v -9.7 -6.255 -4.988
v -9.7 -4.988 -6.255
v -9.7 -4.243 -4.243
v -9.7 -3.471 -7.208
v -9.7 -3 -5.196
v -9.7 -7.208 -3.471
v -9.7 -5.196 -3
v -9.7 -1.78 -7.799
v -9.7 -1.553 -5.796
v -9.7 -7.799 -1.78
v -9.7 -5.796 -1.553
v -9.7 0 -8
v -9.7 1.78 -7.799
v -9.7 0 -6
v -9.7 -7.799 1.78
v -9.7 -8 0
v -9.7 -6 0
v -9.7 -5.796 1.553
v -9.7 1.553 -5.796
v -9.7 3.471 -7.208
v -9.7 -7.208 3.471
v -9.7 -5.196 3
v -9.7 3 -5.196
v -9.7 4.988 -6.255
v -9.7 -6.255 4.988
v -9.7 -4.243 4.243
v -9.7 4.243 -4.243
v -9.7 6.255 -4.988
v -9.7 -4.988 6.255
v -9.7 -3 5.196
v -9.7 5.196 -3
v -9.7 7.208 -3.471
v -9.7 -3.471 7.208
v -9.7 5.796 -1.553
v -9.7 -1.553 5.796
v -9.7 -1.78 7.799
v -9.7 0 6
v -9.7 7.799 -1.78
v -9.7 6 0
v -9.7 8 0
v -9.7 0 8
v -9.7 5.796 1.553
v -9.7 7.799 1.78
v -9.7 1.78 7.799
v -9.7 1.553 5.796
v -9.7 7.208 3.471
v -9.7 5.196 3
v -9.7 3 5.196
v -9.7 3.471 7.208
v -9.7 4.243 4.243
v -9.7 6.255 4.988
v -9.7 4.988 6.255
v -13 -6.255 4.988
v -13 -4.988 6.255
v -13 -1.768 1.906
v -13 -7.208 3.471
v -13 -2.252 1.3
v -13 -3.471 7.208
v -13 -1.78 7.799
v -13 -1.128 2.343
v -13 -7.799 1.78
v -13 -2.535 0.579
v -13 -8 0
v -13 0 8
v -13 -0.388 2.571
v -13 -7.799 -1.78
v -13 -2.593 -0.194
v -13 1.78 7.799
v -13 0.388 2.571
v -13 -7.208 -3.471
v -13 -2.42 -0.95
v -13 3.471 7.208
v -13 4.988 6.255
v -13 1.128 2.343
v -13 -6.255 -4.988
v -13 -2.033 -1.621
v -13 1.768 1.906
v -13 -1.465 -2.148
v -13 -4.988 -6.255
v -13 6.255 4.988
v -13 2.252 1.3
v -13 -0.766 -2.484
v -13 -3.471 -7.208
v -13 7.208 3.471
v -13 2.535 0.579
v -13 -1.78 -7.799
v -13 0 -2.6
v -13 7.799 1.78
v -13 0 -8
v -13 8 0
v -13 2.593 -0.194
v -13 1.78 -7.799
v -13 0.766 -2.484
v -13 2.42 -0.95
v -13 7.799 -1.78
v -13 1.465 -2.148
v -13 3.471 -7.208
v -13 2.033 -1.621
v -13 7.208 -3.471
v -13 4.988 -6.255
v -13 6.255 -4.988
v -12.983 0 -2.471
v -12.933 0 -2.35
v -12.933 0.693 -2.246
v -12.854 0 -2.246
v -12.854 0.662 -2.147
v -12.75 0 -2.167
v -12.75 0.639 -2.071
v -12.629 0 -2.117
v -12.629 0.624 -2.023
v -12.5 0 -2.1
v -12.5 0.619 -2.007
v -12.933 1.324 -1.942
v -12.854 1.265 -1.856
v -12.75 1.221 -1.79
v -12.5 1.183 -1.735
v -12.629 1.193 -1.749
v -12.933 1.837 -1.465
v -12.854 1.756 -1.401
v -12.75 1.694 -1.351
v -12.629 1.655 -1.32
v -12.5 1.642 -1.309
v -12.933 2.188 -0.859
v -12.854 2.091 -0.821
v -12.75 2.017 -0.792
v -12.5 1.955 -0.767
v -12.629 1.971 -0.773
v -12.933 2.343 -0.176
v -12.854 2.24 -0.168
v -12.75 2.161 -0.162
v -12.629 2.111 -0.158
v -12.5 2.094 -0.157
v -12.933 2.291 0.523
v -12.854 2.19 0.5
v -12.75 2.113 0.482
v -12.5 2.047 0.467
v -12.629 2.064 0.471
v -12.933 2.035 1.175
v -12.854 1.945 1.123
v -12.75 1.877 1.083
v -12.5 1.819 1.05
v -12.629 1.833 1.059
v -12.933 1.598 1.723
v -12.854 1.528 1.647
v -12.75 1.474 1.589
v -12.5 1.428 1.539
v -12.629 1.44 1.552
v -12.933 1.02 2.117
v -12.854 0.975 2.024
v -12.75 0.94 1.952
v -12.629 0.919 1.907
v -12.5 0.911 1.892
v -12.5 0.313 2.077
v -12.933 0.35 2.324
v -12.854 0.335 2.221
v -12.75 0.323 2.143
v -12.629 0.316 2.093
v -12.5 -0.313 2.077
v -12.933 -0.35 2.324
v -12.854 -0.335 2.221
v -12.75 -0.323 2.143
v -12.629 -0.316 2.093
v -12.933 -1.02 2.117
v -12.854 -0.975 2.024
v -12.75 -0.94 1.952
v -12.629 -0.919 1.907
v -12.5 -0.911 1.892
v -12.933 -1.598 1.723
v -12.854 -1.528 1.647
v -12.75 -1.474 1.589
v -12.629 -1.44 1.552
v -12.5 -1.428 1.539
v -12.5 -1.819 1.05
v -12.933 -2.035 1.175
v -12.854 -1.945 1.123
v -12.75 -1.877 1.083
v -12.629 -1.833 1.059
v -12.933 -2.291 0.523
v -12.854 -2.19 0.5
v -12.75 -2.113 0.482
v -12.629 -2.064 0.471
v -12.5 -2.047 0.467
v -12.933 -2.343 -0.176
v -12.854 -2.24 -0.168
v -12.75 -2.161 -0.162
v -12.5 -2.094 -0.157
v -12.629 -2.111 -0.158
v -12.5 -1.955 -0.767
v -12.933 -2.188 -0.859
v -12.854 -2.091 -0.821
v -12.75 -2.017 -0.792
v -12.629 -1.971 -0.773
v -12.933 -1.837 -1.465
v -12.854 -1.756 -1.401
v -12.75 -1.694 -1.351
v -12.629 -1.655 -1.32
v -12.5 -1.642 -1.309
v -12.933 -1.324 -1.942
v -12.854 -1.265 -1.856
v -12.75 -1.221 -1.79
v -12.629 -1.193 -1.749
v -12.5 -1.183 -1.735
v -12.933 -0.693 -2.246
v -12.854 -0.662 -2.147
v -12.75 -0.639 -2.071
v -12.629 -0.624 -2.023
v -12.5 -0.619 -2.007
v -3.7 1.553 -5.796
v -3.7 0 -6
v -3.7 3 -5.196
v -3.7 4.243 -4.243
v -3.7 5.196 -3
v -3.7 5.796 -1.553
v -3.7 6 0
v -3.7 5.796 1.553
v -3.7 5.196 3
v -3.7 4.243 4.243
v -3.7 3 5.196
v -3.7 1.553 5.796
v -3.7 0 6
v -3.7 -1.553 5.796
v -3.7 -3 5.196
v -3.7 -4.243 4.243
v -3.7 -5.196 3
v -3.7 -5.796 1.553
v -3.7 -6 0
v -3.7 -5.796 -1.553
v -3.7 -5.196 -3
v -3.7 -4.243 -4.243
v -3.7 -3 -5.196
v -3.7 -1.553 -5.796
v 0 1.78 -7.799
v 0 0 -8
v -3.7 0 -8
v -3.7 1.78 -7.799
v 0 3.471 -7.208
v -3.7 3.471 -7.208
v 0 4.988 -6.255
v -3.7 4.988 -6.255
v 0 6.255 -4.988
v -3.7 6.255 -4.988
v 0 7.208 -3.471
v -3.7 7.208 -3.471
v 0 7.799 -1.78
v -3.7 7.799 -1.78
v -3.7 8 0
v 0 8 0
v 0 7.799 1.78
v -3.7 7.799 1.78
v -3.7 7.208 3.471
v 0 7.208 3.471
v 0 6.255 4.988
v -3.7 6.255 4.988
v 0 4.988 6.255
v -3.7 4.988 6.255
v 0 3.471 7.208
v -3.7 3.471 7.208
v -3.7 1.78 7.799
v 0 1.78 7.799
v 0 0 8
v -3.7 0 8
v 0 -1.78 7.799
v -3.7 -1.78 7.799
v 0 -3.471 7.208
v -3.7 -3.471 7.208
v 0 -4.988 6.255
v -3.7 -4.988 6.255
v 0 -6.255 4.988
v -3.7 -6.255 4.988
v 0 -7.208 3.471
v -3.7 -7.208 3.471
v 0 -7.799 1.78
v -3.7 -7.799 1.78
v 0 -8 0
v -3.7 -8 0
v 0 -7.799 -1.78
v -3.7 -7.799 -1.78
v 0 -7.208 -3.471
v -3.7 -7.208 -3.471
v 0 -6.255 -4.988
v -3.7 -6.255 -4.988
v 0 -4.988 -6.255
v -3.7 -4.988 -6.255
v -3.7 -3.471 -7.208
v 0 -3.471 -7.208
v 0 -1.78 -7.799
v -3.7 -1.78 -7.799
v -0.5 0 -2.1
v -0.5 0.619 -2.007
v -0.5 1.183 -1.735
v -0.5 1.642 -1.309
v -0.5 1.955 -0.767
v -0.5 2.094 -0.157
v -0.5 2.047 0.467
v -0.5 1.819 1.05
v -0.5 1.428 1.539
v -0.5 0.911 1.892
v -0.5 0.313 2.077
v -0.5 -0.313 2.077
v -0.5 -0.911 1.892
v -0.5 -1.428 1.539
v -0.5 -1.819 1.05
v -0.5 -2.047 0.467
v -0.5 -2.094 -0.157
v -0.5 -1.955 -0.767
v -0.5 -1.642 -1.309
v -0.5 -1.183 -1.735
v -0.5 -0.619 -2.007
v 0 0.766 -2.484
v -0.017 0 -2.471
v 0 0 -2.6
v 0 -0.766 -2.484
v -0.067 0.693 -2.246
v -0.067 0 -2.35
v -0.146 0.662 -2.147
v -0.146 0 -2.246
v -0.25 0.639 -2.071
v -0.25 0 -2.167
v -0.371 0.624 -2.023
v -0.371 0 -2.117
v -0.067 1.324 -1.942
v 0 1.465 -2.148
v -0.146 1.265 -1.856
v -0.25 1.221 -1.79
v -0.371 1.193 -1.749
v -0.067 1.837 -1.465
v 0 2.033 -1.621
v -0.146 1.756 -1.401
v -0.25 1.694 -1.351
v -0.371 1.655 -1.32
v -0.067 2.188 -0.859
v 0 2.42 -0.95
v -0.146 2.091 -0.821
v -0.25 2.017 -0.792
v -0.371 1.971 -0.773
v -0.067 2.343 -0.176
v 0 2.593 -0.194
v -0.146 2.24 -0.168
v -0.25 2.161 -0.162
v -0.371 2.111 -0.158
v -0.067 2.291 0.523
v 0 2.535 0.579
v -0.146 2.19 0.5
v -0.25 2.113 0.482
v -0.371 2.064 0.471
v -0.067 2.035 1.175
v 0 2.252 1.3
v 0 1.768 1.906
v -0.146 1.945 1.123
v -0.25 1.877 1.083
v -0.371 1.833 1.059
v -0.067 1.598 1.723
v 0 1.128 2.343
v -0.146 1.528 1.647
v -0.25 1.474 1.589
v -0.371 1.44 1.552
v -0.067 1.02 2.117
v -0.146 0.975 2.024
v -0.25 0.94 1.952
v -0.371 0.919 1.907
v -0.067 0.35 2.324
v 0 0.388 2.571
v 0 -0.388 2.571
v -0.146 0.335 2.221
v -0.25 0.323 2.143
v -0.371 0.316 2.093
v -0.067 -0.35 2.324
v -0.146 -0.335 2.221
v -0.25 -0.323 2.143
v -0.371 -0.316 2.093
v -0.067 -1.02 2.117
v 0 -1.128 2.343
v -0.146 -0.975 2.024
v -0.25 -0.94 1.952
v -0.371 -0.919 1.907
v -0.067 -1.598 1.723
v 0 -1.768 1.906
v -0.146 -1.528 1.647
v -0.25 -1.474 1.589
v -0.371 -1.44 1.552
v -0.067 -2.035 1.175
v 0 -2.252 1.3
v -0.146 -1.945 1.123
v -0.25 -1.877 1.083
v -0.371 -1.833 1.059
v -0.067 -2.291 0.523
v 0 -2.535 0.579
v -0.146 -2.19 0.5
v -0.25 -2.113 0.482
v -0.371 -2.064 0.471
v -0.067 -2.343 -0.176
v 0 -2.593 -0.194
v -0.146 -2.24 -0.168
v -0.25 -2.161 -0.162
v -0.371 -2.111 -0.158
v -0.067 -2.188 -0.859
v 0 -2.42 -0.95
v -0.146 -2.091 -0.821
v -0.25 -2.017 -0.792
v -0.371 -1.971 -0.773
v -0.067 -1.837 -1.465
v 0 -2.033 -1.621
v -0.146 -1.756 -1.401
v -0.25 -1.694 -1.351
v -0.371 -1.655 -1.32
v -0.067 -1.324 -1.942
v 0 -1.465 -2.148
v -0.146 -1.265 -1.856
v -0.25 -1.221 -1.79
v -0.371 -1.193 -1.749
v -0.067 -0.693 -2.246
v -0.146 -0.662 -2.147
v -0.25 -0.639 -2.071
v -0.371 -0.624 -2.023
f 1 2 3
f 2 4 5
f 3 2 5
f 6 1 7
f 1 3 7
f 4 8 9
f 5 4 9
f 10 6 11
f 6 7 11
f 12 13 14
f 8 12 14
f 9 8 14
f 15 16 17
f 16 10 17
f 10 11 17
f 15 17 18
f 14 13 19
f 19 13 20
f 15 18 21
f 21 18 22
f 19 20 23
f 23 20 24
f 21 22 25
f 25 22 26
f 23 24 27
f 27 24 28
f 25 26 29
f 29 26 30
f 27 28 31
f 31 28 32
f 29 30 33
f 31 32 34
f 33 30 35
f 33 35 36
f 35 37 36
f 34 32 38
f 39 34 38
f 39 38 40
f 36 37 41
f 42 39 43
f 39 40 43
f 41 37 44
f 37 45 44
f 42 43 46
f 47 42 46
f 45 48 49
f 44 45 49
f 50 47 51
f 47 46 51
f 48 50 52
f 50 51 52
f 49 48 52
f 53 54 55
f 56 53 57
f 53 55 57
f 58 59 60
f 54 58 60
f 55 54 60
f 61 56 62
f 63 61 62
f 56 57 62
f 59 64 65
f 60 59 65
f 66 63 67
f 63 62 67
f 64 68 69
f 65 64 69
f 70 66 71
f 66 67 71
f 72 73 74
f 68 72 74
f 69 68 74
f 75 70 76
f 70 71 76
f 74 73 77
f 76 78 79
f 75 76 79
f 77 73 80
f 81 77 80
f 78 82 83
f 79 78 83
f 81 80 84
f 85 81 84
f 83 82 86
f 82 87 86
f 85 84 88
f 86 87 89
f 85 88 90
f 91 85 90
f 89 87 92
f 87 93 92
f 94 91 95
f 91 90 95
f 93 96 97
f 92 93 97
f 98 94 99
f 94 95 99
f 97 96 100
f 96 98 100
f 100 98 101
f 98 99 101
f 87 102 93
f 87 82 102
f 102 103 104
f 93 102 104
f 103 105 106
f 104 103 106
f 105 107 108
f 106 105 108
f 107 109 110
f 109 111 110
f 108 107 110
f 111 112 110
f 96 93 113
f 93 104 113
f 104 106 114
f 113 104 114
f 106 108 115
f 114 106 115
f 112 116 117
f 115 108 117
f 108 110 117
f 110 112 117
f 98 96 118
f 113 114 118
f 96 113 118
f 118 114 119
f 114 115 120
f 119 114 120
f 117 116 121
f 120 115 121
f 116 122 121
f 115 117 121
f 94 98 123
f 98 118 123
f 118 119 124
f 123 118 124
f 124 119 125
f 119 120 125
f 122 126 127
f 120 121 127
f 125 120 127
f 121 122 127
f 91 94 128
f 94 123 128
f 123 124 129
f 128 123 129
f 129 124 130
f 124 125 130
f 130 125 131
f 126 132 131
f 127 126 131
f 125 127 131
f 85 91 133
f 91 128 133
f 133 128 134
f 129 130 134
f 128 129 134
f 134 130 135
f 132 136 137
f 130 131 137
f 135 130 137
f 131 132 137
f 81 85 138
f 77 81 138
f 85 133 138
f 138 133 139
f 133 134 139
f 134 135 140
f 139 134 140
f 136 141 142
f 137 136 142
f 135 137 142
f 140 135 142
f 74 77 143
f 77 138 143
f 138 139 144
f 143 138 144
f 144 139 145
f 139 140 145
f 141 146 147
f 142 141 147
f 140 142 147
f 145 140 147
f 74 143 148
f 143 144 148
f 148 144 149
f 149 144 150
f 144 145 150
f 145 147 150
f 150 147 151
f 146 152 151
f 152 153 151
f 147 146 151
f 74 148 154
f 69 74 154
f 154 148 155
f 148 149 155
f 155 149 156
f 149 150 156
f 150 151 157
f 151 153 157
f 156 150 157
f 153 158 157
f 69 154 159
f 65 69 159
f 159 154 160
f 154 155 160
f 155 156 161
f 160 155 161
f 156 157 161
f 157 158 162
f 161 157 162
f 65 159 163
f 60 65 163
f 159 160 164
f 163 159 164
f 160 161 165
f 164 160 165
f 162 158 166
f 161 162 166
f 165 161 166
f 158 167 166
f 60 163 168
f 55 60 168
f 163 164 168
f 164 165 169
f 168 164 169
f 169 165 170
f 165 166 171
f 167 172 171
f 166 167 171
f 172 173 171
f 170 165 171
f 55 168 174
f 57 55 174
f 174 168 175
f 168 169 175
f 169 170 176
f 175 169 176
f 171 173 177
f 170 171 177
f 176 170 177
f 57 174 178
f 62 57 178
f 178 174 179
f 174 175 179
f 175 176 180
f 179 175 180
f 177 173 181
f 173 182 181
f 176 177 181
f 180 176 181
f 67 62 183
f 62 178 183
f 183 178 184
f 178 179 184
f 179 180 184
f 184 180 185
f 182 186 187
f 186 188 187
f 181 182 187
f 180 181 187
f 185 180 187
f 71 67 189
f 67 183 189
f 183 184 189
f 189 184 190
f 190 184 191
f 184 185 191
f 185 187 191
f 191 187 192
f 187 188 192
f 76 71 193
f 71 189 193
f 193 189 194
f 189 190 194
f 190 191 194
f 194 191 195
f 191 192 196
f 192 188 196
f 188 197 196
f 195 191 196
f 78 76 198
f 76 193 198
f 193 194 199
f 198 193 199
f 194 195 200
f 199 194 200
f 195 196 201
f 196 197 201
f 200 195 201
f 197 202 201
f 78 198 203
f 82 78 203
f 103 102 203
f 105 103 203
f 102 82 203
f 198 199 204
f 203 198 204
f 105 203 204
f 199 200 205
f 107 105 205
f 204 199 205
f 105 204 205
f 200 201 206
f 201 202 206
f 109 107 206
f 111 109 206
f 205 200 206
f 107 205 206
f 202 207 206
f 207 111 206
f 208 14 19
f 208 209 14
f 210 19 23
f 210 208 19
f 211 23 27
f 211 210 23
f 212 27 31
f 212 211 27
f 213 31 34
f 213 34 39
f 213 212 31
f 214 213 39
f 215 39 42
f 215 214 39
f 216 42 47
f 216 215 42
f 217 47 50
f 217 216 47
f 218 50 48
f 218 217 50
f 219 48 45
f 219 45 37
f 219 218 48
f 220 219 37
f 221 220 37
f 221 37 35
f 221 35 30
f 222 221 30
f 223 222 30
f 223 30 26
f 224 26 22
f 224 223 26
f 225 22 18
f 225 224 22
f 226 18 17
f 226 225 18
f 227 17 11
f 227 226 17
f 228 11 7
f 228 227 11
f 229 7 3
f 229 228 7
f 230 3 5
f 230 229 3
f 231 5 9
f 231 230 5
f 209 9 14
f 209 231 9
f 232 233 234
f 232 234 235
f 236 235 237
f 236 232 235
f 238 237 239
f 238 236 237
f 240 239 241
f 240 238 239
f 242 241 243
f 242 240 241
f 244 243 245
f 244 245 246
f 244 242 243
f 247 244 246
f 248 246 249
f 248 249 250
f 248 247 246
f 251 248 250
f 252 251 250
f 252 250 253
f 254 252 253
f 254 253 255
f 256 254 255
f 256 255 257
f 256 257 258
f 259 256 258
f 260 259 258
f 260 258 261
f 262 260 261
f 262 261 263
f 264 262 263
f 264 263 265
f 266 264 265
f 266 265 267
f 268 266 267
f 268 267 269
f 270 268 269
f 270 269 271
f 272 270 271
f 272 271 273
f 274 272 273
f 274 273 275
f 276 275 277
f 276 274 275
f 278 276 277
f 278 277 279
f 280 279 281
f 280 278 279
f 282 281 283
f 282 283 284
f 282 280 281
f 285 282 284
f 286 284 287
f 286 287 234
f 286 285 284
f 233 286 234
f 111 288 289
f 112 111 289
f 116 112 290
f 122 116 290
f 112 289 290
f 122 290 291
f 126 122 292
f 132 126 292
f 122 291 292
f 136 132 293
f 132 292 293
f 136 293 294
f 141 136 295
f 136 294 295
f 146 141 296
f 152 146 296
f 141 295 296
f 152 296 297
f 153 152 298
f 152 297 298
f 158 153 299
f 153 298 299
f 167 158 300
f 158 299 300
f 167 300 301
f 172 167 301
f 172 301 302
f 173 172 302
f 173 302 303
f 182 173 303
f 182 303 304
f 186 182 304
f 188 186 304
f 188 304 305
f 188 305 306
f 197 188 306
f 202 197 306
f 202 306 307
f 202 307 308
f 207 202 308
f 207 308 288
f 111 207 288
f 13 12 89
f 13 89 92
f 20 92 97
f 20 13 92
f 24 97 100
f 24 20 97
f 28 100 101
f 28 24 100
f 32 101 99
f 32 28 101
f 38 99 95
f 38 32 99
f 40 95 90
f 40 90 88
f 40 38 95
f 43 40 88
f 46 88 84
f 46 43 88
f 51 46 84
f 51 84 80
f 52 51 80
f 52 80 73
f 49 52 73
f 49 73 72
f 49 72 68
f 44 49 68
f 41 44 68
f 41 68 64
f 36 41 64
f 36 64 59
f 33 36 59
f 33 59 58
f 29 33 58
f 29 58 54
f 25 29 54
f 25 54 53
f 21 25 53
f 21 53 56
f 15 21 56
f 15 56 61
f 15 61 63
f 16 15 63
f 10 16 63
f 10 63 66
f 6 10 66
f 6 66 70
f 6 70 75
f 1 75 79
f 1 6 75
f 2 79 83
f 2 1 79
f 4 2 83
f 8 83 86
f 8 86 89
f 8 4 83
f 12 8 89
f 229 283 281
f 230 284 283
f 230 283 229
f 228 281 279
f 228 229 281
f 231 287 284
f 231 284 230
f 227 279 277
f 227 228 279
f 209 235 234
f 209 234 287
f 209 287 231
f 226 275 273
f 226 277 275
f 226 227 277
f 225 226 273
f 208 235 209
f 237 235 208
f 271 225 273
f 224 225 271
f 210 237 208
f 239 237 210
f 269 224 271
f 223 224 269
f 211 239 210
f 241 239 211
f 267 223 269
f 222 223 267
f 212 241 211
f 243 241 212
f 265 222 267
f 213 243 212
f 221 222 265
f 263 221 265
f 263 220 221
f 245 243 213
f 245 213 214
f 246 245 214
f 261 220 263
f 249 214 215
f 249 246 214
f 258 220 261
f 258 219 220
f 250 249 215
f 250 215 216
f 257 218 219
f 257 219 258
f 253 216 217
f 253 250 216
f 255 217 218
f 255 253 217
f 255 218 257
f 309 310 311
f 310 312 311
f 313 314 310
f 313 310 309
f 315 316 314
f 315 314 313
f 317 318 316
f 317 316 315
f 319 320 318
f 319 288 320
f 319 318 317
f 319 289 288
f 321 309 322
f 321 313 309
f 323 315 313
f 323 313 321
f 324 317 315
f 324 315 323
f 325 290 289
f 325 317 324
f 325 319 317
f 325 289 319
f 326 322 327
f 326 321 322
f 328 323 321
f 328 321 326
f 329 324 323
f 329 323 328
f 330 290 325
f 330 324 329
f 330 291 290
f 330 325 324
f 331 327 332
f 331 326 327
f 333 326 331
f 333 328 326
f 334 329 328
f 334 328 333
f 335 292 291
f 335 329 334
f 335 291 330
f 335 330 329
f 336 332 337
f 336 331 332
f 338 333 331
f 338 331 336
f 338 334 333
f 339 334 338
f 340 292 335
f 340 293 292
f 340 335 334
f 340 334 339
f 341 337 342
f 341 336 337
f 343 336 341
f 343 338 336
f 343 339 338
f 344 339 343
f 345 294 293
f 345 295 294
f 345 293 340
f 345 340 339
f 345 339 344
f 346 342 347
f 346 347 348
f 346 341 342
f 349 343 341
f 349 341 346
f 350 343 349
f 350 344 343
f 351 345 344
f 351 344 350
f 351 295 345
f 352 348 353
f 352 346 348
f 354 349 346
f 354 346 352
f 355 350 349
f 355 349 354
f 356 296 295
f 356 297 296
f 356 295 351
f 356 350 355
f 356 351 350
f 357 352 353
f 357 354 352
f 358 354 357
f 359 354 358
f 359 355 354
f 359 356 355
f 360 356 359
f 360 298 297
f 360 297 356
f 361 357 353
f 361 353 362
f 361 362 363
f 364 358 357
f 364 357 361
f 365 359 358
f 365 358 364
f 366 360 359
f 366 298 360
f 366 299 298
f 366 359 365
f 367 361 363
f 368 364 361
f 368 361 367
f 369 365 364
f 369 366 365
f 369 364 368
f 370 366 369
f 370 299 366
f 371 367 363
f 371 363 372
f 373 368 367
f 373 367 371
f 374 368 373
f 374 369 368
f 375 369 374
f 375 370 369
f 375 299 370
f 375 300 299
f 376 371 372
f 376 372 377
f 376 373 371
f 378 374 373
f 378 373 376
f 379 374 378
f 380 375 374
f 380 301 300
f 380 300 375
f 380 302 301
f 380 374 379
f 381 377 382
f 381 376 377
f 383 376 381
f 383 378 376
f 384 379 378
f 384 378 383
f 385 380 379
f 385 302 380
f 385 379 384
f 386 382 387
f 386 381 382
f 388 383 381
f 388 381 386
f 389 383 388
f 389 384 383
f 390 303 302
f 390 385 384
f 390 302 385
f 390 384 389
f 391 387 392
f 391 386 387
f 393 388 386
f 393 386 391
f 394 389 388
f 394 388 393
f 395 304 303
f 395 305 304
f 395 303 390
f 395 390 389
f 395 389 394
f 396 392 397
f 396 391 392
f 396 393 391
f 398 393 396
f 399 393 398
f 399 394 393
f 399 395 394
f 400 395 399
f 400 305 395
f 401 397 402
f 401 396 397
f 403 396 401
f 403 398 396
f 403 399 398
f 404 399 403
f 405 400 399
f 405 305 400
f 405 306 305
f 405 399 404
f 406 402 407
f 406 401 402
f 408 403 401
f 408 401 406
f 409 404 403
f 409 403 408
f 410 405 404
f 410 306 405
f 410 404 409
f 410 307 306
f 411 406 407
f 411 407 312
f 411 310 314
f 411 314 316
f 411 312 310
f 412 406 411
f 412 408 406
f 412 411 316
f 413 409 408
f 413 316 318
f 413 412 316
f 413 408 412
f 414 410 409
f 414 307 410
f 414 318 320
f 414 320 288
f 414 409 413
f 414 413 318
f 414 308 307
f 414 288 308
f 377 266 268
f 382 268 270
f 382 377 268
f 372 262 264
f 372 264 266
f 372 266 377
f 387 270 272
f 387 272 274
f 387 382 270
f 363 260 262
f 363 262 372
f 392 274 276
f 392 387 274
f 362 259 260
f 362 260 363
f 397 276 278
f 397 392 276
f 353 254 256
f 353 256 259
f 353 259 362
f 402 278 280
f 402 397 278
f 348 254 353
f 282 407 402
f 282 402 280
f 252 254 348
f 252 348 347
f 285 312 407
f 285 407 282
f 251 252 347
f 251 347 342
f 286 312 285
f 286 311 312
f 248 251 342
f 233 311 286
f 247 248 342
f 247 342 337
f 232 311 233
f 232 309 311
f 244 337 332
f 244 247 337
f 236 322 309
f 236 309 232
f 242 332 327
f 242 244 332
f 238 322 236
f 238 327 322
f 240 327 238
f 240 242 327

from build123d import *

# Parameters (mm, degrees)
SKETCH1_R           = 8
BOSS_EXTRUDE1_DEPTH = 13
SKETCH4_R           = 2.1
CUT_EXTRUDE1_DEPTH  = 18.23368794
FILLET1_R           = 0.5
SKETCH2_W           = 6
SKETCH2_H           = 2


with BuildPart() as part:
    # Sketch1 → Boss-Extrude1 (new body)
    with BuildSketch(Plane(origin=(0, 0, 0), x_dir=(0, 0, -1), z_dir=(1, 0, 0))):
        Circle(SKETCH1_R)
    extrude(amount=-BOSS_EXTRUDE1_DEPTH)

    # Sketch4 → Cut-Extrude1 (cut, through all)
    with BuildSketch(Plane(origin=(0, 0, 0), x_dir=(0, 0, -1), z_dir=(1, 0, 0))):
        Circle(SKETCH4_R)
    extrude(amount=-CUT_EXTRUDE1_DEPTH, mode=Mode.SUBTRACT)

    # Fillet1
    fillet1_edges = [part.edges().sort_by_distance(p)[0] for p in [
        (-13, 0, 2.1),
        (0, 0, 2.1),
    ]]
    fillet(fillet1_edges, radius=FILLET1_R)

    # Sketch2 → Cut-Revolve1 (revolve, cut)
    with BuildSketch(Plane.XY, mode=Mode.PRIVATE) as cut_revolve1_sk:
        with Locations((-6.7, 7)):
            Rectangle(SKETCH2_W, SKETCH2_H)
    revolve(cut_revolve1_sk.sketch.rotate(Axis((-13, 0, 0), (1, 0, 0)), 270), axis=Axis((-13, 0, 0), (1, 0, 0)), mode=Mode.SUBTRACT)


solid = part.part
